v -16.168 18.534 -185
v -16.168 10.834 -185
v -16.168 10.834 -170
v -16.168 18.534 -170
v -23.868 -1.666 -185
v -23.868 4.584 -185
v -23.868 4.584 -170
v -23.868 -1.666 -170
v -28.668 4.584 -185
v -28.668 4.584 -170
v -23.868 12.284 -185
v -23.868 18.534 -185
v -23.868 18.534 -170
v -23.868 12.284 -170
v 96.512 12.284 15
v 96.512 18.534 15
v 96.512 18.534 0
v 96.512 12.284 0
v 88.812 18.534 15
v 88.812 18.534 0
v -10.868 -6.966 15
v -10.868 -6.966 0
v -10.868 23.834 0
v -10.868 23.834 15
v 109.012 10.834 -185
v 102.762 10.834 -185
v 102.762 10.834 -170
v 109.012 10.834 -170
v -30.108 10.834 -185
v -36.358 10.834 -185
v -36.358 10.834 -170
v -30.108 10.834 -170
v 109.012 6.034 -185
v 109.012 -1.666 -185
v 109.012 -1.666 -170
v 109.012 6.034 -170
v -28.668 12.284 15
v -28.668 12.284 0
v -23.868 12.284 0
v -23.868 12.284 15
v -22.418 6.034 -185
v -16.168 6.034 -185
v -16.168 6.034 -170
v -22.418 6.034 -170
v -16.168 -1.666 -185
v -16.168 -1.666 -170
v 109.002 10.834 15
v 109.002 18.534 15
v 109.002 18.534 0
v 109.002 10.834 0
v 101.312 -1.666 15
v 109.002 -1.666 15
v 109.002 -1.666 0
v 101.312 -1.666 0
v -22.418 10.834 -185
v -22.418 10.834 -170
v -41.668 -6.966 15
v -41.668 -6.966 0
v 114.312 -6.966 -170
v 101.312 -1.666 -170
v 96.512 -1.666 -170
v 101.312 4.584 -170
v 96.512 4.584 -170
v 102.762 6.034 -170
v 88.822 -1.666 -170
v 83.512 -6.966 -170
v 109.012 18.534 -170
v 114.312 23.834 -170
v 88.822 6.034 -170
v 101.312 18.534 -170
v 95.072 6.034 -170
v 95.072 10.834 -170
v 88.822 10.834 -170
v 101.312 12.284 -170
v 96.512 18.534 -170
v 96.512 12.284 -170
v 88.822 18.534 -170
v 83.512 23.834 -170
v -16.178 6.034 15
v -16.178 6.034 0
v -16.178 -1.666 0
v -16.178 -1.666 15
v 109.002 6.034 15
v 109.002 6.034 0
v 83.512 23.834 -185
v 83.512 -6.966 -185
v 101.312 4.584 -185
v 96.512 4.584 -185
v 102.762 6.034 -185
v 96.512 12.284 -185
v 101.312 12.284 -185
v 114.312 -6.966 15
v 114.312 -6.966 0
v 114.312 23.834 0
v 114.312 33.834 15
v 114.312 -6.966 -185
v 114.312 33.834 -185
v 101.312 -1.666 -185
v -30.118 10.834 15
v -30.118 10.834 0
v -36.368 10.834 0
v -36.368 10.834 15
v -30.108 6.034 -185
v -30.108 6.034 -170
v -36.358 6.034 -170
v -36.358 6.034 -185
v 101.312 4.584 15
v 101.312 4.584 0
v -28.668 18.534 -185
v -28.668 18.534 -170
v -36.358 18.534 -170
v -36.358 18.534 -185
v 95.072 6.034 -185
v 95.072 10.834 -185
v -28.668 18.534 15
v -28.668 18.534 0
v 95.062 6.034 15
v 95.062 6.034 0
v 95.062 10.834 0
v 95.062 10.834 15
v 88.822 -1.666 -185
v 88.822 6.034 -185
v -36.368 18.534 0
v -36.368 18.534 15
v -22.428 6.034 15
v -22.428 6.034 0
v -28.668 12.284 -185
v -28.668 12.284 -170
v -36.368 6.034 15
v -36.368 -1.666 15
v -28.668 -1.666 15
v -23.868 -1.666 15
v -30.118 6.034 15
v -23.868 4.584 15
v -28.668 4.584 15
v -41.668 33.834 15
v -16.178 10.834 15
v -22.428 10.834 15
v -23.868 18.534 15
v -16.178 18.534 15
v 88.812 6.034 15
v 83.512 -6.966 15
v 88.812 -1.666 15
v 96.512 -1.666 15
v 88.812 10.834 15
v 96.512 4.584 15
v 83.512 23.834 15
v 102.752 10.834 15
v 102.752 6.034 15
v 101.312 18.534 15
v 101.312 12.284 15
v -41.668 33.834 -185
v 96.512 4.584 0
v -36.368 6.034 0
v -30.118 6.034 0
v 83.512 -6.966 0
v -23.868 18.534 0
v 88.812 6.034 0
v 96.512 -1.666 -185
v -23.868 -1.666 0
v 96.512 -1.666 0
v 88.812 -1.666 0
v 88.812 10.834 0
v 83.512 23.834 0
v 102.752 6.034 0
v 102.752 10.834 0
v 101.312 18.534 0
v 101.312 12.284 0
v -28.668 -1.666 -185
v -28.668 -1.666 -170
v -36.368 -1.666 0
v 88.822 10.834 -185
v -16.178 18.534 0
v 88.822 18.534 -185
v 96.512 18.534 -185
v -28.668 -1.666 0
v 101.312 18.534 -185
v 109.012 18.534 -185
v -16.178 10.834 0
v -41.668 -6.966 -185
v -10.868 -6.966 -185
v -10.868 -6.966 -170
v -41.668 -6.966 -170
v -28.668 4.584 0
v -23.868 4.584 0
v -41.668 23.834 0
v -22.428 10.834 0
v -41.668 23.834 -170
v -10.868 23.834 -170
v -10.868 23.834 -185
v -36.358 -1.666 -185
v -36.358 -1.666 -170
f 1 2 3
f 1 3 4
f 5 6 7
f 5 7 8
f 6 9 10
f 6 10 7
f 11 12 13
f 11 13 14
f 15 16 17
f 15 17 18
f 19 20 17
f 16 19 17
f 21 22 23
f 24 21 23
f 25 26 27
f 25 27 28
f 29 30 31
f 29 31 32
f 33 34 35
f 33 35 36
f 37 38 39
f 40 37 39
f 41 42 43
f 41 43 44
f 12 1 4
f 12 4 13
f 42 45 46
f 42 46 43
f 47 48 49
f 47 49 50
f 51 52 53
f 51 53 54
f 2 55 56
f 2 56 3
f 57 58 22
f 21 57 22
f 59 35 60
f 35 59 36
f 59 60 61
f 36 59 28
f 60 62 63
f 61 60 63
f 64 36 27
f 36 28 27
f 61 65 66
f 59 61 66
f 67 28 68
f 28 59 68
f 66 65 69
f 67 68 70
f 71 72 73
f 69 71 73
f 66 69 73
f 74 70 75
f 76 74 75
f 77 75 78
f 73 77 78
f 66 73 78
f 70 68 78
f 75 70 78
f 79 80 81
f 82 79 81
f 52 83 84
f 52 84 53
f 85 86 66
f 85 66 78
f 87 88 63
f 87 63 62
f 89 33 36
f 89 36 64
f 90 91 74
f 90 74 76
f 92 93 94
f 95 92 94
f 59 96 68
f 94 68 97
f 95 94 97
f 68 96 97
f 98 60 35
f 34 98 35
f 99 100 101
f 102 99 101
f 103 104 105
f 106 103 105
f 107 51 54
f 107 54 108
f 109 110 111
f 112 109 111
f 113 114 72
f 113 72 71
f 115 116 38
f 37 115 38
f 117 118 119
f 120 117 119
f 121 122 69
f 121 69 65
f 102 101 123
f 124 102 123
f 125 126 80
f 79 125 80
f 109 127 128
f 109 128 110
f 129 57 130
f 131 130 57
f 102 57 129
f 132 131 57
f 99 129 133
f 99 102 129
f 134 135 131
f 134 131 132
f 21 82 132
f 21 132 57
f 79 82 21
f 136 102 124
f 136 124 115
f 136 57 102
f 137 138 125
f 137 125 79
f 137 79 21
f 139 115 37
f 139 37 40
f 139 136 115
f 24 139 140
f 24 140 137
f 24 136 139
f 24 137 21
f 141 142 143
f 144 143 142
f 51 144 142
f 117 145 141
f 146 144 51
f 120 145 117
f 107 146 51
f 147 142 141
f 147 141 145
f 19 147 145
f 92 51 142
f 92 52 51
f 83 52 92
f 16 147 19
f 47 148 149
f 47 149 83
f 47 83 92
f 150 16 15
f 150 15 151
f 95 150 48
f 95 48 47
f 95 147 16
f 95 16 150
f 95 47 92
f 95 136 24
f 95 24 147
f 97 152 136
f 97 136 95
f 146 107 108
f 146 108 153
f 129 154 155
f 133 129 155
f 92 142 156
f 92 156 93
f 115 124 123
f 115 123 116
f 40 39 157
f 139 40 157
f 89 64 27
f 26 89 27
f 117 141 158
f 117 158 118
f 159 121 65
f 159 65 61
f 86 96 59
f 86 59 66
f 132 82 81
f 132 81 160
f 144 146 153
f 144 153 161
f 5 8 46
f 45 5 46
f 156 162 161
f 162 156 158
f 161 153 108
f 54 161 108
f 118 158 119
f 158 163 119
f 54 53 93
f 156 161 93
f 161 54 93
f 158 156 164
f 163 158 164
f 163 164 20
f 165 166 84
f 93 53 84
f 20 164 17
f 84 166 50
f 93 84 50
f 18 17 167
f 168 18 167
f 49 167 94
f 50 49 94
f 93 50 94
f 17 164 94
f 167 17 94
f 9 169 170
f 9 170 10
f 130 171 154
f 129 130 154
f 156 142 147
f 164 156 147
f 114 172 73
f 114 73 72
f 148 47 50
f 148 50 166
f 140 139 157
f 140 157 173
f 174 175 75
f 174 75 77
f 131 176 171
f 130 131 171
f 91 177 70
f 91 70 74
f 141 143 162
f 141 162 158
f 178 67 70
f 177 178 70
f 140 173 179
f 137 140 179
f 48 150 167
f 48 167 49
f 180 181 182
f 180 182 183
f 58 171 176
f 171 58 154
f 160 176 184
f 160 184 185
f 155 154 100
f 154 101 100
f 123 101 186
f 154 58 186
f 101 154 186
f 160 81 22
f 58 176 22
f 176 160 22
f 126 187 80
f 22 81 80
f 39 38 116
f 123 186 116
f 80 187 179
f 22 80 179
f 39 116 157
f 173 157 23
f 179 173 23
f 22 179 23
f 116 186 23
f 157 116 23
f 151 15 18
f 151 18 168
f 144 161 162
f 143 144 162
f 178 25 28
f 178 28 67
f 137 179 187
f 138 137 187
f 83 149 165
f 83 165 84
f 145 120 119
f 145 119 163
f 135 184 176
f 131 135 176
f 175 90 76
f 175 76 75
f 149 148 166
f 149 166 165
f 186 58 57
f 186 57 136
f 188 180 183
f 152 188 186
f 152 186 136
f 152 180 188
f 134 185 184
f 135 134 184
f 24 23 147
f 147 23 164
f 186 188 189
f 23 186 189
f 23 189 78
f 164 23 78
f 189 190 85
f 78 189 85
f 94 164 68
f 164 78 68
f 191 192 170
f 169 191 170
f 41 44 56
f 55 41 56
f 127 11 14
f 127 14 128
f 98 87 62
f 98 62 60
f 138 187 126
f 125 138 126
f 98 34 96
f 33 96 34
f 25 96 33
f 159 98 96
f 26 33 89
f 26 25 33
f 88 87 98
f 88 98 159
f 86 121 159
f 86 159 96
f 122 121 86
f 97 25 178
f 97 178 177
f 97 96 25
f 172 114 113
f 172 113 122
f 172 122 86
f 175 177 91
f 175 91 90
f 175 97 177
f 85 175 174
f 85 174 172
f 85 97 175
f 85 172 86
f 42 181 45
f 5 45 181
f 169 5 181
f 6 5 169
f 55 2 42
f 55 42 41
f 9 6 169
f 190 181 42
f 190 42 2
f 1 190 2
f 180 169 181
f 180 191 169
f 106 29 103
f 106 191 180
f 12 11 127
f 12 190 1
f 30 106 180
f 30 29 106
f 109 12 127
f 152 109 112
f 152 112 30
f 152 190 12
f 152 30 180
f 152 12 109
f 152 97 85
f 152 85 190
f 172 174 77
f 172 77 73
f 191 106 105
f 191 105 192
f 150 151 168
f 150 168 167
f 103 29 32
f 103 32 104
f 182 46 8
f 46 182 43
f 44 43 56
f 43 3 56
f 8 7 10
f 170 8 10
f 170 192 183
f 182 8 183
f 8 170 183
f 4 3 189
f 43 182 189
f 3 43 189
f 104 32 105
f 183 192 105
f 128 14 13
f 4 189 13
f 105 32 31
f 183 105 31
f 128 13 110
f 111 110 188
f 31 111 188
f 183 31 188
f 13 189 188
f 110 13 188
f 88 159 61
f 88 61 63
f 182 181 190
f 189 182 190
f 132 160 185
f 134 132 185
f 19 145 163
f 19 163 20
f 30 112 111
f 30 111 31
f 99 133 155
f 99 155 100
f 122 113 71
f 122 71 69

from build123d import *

# Parameters (mm, degrees)
ESQUISSE1_W         = 30.8
ESQUISSE1_H         = 30.8
BOSS_EXTRU_1_DEPTH  = 15
ESQUISSE6_W         = 155.98
ESQUISSE6_H         = 200
BOSS_EXTRU_4_DEPTH  = 10
ESQUISSE16_W        = 30.8
ESQUISSE16_H        = 30.8
BOSS_EXTRU_12_DEPTH = 15
ESQUISSE25_W        = 30.8
ESQUISSE25_H        = 30.8
BOSS_EXTRU_21_DEPTH = 15
ESQUISSE26_W        = 30.8
ESQUISSE26_H        = 30.8
BOSS_EXTRU_22_DEPTH = 15


with BuildPart() as part:
    # Esquisse1 → Boss.-Extru.1 (new body)
    with BuildSketch(Plane.XY):
        with Locations((-26.267627057, 8.434243976)):
            Rectangle(ESQUISSE1_W, ESQUISSE1_H)
        Polygon((-30.117627057, 6.034243976), (-30.117627057, 10.834243976), (-36.367627057, 10.834243976), (-36.367627057, 18.534243976), (-28.667627057, 18.534243976), (-28.667627057, 12.284243976), (-23.867627057, 12.284243976), (-23.867627057, 18.534243976), (-16.177627057, 18.534243976), (-16.177627057, 10.834243976), (-22.427627057, 10.834243976), (-22.427627057, 6.034243976), (-16.177627057, 6.034243976), (-16.177627057, -1.665756024), (-23.867627057, -1.665756024), (-23.867627057, 4.584243976), (-28.667627057, 4.584243976), (-28.667627057, -1.665756024), (-36.367627057, -1.665756024), (-36.367627057, 6.034243976), align=None, mode=Mode.SUBTRACT)
    extrude(amount=BOSS_EXTRU_1_DEPTH)

    # Esquisse6 → Boss.-Extru.4 (add)
    with BuildSketch(Plane(origin=(0, 23.834243976, 0), x_dir=(1, 0, 0), z_dir=(0, 1, 0))):
        with Locations((36.322372943, 85)):
            Rectangle(ESQUISSE6_W, ESQUISSE6_H)
    extrude(amount=BOSS_EXTRU_4_DEPTH)

    # Esquisse16 → Boss.-Extru.12 (add)
    with BuildSketch(Plane.XY.offset(15)):
        with Locations((98.912372943, 8.434243976)):
            Rectangle(ESQUISSE16_W, ESQUISSE16_H)
        Polygon((95.062372943, 6.034243976), (95.062372943, 10.834243976), (88.812372943, 10.834243976), (88.812372943, 18.534243976), (96.512372943, 18.534243976), (96.512372943, 12.284243976), (101.312372943, 12.284243976), (101.312372943, 18.534243976), (109.002372943, 18.534243976), (109.002372943, 10.834243976), (102.752372943, 10.834243976), (102.752372943, 6.034243976), (109.002372943, 6.034243976), (109.002372943, -1.665756024), (101.312372943, -1.665756024), (101.312372943, 4.584243976), (96.512372943, 4.584243976), (96.512372943, -1.665756024), (88.812372943, -1.665756024), (88.812372943, 6.034243976), align=None, mode=Mode.SUBTRACT)
    extrude(amount=-BOSS_EXTRU_12_DEPTH)

    # Esquisse25 → Boss.-Extru.21 (add)
    with BuildSketch(Plane(origin=(0, 0, -185), x_dir=(-1, 0, 0), z_dir=(0, 0, -1))):
        with Locations((-98.912372943, 8.434243976)):
            Rectangle(ESQUISSE25_W, ESQUISSE25_H)
        Polygon((-102.762372943, 6.034243976), (-102.762372943, 10.834243976), (-109.012372943, 10.834243976), (-109.012372943, 18.534243976), (-101.312372943, 18.534243976), (-101.312372943, 12.284243976), (-96.512372943, 12.284243976), (-96.512372943, 18.534243976), (-88.822372943, 18.534243976), (-88.822372943, 10.834243976), (-95.072372943, 10.834243976), (-95.072372943, 6.034243976), (-88.822372943, 6.034243976), (-88.822372943, -1.665756024), (-96.512372943, -1.665756024), (-96.512372943, 4.584243976), (-101.312372943, 4.584243976), (-101.312372943, -1.665756024), (-109.012372943, -1.665756024), (-109.012372943, 6.034243976), align=None, mode=Mode.SUBTRACT)
    extrude(amount=-BOSS_EXTRU_21_DEPTH)

    # Esquisse26 → Boss.-Extru.22 (add)
    with BuildSketch(Plane(origin=(0, 0, -185), x_dir=(-1, 0, 0), z_dir=(0, 0, -1))):
        with Locations((26.267627057, 8.434243976)):
            Rectangle(ESQUISSE26_W, ESQUISSE26_H)
        Polygon((22.417627057, 6.034243976), (22.417627057, 10.834243976), (16.167627057, 10.834243976), (16.167627057, 18.534243976), (23.867627057, 18.534243976), (23.867627057, 12.284243976), (28.667627057, 12.284243976), (28.667627057, 18.534243976), (36.357627057, 18.534243976), (36.357627057, 10.834243976), (30.107627057, 10.834243976), (30.107627057, 6.034243976), (36.357627057, 6.034243976), (36.357627057, -1.665756024), (28.667627057, -1.665756024), (28.667627057, 4.584243976), (23.867627057, 4.584243976), (23.867627057, -1.665756024), (16.167627057, -1.665756024), (16.167627057, 6.034243976), align=None, mode=Mode.SUBTRACT)
    extrude(amount=-BOSS_EXTRU_22_DEPTH)


solid = part.part
